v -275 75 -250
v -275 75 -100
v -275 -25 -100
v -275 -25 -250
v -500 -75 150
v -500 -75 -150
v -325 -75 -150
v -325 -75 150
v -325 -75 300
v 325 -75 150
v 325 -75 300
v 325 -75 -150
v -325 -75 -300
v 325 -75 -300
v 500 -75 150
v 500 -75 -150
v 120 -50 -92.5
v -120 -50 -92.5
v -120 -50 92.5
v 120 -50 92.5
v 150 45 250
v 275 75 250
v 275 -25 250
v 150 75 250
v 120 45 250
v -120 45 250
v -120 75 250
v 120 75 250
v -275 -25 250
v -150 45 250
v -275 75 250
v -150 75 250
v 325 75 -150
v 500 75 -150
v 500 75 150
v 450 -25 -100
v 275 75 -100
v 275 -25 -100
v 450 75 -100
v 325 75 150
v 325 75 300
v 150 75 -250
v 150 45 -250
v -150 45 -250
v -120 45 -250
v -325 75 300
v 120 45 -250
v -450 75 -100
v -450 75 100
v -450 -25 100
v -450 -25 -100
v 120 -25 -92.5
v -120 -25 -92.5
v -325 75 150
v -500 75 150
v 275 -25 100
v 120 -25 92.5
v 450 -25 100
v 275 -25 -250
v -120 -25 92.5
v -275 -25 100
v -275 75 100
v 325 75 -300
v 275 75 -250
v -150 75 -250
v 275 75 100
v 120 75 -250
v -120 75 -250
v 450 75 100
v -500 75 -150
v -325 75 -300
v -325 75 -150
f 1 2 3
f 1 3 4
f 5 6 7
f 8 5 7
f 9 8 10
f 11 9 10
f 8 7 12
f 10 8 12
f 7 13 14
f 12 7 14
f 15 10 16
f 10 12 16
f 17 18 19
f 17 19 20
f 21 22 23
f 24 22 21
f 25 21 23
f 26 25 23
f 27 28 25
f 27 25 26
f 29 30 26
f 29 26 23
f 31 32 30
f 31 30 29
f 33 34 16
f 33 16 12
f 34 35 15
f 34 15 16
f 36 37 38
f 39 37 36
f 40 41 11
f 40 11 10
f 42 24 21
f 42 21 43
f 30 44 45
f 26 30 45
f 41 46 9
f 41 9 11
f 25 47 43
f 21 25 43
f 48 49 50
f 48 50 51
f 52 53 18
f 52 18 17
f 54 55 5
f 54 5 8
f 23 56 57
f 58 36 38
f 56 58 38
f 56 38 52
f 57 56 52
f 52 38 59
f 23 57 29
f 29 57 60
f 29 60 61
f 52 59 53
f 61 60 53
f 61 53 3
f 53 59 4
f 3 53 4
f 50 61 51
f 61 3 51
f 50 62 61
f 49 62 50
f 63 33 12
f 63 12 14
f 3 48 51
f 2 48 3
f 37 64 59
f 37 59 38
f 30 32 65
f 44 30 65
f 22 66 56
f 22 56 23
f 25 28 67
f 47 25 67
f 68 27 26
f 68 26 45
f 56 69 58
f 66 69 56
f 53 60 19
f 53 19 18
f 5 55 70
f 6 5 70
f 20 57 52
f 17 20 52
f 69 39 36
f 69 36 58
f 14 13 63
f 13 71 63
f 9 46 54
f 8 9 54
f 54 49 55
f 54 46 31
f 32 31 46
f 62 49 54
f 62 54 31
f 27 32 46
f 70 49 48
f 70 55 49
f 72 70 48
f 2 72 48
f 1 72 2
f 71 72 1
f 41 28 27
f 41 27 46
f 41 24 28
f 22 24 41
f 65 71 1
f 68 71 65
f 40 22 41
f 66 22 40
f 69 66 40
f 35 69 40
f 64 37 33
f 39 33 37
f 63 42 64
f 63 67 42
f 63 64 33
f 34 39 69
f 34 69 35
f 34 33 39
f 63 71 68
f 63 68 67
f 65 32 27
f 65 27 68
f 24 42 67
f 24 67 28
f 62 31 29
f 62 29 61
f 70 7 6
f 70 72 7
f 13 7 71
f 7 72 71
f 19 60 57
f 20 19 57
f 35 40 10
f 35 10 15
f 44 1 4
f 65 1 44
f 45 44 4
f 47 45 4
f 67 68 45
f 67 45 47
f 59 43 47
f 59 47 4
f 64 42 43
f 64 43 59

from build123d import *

# Parameters (mm, degrees)
SKETCH1_W           = 650
SKETCH1_H           = 300
SKETCH1_W_2         = 175
SKETCH1_H_2         = 150
BOSS_EXTRUDE1_DEPTH = 75
SKETCH2_W           = 240
SKETCH2_H           = 185
CUT_EXTRUDE1_DEPTH  = 125
CUT_EXTRUDE2_DEPTH  = 100
SKETCH4_W           = 30
SKETCH4_H           = 500
BOSS_EXTRUDE2_DEPTH = 30


with BuildPart() as part:
    # Sketch1 → Boss-Extrude1 (new, symmetric)
    with BuildSketch(Plane(origin=(0, 0, 0), x_dir=(1, 0, 0), z_dir=(0, 1, 0))):
        Rectangle(SKETCH1_W, SKETCH1_H)
        with Locations((-412.5, 0)):
            Rectangle(SKETCH1_W_2, SKETCH1_H)
        with Locations((0, -225)):
            Rectangle(SKETCH1_W, SKETCH1_H_2)
        with Locations((412.5, 0)):
            Rectangle(SKETCH1_W_2, SKETCH1_H)
        with Locations((0, 225)):
            Rectangle(SKETCH1_W, SKETCH1_H_2)
    extrude(amount=BOSS_EXTRUDE1_DEPTH, both=True)

    # Sketch2 → Cut-Extrude1 (cut)
    with BuildSketch(Plane(origin=(0, 75, 0), x_dir=(1, 0, 0), z_dir=(0, 1, 0))):
        Rectangle(SKETCH2_W, SKETCH2_H)
    extrude(amount=-CUT_EXTRUDE1_DEPTH, mode=Mode.SUBTRACT)

    # Sketch3 → Cut-Extrude2 (cut)
    with BuildSketch(Plane(origin=(0, 75, 0), x_dir=(1, 0, 0), z_dir=(0, 1, 0))):
        Polygon((-450, 100), (-275, 100), (-275, 250), (275, 250), (275, 100), (450, 100), (450, -100), (275, -100), (275, -250), (-275, -250), (-275, -100), (-450, -100), align=None)
    extrude(amount=-CUT_EXTRUDE2_DEPTH, mode=Mode.SUBTRACT)

    # Sketch4 → Boss-Extrude2 (add)
    with BuildSketch(Plane(origin=(0, 75, 0), x_dir=(1, 0, 0), z_dir=(0, 1, 0))):
        with Locations((-135, 0)):
            Rectangle(SKETCH4_W, SKETCH4_H)
        with Locations((135, 0)):
            Rectangle(SKETCH4_W, SKETCH4_H)
    extrude(amount=-BOSS_EXTRUDE2_DEPTH)


solid = part.part
